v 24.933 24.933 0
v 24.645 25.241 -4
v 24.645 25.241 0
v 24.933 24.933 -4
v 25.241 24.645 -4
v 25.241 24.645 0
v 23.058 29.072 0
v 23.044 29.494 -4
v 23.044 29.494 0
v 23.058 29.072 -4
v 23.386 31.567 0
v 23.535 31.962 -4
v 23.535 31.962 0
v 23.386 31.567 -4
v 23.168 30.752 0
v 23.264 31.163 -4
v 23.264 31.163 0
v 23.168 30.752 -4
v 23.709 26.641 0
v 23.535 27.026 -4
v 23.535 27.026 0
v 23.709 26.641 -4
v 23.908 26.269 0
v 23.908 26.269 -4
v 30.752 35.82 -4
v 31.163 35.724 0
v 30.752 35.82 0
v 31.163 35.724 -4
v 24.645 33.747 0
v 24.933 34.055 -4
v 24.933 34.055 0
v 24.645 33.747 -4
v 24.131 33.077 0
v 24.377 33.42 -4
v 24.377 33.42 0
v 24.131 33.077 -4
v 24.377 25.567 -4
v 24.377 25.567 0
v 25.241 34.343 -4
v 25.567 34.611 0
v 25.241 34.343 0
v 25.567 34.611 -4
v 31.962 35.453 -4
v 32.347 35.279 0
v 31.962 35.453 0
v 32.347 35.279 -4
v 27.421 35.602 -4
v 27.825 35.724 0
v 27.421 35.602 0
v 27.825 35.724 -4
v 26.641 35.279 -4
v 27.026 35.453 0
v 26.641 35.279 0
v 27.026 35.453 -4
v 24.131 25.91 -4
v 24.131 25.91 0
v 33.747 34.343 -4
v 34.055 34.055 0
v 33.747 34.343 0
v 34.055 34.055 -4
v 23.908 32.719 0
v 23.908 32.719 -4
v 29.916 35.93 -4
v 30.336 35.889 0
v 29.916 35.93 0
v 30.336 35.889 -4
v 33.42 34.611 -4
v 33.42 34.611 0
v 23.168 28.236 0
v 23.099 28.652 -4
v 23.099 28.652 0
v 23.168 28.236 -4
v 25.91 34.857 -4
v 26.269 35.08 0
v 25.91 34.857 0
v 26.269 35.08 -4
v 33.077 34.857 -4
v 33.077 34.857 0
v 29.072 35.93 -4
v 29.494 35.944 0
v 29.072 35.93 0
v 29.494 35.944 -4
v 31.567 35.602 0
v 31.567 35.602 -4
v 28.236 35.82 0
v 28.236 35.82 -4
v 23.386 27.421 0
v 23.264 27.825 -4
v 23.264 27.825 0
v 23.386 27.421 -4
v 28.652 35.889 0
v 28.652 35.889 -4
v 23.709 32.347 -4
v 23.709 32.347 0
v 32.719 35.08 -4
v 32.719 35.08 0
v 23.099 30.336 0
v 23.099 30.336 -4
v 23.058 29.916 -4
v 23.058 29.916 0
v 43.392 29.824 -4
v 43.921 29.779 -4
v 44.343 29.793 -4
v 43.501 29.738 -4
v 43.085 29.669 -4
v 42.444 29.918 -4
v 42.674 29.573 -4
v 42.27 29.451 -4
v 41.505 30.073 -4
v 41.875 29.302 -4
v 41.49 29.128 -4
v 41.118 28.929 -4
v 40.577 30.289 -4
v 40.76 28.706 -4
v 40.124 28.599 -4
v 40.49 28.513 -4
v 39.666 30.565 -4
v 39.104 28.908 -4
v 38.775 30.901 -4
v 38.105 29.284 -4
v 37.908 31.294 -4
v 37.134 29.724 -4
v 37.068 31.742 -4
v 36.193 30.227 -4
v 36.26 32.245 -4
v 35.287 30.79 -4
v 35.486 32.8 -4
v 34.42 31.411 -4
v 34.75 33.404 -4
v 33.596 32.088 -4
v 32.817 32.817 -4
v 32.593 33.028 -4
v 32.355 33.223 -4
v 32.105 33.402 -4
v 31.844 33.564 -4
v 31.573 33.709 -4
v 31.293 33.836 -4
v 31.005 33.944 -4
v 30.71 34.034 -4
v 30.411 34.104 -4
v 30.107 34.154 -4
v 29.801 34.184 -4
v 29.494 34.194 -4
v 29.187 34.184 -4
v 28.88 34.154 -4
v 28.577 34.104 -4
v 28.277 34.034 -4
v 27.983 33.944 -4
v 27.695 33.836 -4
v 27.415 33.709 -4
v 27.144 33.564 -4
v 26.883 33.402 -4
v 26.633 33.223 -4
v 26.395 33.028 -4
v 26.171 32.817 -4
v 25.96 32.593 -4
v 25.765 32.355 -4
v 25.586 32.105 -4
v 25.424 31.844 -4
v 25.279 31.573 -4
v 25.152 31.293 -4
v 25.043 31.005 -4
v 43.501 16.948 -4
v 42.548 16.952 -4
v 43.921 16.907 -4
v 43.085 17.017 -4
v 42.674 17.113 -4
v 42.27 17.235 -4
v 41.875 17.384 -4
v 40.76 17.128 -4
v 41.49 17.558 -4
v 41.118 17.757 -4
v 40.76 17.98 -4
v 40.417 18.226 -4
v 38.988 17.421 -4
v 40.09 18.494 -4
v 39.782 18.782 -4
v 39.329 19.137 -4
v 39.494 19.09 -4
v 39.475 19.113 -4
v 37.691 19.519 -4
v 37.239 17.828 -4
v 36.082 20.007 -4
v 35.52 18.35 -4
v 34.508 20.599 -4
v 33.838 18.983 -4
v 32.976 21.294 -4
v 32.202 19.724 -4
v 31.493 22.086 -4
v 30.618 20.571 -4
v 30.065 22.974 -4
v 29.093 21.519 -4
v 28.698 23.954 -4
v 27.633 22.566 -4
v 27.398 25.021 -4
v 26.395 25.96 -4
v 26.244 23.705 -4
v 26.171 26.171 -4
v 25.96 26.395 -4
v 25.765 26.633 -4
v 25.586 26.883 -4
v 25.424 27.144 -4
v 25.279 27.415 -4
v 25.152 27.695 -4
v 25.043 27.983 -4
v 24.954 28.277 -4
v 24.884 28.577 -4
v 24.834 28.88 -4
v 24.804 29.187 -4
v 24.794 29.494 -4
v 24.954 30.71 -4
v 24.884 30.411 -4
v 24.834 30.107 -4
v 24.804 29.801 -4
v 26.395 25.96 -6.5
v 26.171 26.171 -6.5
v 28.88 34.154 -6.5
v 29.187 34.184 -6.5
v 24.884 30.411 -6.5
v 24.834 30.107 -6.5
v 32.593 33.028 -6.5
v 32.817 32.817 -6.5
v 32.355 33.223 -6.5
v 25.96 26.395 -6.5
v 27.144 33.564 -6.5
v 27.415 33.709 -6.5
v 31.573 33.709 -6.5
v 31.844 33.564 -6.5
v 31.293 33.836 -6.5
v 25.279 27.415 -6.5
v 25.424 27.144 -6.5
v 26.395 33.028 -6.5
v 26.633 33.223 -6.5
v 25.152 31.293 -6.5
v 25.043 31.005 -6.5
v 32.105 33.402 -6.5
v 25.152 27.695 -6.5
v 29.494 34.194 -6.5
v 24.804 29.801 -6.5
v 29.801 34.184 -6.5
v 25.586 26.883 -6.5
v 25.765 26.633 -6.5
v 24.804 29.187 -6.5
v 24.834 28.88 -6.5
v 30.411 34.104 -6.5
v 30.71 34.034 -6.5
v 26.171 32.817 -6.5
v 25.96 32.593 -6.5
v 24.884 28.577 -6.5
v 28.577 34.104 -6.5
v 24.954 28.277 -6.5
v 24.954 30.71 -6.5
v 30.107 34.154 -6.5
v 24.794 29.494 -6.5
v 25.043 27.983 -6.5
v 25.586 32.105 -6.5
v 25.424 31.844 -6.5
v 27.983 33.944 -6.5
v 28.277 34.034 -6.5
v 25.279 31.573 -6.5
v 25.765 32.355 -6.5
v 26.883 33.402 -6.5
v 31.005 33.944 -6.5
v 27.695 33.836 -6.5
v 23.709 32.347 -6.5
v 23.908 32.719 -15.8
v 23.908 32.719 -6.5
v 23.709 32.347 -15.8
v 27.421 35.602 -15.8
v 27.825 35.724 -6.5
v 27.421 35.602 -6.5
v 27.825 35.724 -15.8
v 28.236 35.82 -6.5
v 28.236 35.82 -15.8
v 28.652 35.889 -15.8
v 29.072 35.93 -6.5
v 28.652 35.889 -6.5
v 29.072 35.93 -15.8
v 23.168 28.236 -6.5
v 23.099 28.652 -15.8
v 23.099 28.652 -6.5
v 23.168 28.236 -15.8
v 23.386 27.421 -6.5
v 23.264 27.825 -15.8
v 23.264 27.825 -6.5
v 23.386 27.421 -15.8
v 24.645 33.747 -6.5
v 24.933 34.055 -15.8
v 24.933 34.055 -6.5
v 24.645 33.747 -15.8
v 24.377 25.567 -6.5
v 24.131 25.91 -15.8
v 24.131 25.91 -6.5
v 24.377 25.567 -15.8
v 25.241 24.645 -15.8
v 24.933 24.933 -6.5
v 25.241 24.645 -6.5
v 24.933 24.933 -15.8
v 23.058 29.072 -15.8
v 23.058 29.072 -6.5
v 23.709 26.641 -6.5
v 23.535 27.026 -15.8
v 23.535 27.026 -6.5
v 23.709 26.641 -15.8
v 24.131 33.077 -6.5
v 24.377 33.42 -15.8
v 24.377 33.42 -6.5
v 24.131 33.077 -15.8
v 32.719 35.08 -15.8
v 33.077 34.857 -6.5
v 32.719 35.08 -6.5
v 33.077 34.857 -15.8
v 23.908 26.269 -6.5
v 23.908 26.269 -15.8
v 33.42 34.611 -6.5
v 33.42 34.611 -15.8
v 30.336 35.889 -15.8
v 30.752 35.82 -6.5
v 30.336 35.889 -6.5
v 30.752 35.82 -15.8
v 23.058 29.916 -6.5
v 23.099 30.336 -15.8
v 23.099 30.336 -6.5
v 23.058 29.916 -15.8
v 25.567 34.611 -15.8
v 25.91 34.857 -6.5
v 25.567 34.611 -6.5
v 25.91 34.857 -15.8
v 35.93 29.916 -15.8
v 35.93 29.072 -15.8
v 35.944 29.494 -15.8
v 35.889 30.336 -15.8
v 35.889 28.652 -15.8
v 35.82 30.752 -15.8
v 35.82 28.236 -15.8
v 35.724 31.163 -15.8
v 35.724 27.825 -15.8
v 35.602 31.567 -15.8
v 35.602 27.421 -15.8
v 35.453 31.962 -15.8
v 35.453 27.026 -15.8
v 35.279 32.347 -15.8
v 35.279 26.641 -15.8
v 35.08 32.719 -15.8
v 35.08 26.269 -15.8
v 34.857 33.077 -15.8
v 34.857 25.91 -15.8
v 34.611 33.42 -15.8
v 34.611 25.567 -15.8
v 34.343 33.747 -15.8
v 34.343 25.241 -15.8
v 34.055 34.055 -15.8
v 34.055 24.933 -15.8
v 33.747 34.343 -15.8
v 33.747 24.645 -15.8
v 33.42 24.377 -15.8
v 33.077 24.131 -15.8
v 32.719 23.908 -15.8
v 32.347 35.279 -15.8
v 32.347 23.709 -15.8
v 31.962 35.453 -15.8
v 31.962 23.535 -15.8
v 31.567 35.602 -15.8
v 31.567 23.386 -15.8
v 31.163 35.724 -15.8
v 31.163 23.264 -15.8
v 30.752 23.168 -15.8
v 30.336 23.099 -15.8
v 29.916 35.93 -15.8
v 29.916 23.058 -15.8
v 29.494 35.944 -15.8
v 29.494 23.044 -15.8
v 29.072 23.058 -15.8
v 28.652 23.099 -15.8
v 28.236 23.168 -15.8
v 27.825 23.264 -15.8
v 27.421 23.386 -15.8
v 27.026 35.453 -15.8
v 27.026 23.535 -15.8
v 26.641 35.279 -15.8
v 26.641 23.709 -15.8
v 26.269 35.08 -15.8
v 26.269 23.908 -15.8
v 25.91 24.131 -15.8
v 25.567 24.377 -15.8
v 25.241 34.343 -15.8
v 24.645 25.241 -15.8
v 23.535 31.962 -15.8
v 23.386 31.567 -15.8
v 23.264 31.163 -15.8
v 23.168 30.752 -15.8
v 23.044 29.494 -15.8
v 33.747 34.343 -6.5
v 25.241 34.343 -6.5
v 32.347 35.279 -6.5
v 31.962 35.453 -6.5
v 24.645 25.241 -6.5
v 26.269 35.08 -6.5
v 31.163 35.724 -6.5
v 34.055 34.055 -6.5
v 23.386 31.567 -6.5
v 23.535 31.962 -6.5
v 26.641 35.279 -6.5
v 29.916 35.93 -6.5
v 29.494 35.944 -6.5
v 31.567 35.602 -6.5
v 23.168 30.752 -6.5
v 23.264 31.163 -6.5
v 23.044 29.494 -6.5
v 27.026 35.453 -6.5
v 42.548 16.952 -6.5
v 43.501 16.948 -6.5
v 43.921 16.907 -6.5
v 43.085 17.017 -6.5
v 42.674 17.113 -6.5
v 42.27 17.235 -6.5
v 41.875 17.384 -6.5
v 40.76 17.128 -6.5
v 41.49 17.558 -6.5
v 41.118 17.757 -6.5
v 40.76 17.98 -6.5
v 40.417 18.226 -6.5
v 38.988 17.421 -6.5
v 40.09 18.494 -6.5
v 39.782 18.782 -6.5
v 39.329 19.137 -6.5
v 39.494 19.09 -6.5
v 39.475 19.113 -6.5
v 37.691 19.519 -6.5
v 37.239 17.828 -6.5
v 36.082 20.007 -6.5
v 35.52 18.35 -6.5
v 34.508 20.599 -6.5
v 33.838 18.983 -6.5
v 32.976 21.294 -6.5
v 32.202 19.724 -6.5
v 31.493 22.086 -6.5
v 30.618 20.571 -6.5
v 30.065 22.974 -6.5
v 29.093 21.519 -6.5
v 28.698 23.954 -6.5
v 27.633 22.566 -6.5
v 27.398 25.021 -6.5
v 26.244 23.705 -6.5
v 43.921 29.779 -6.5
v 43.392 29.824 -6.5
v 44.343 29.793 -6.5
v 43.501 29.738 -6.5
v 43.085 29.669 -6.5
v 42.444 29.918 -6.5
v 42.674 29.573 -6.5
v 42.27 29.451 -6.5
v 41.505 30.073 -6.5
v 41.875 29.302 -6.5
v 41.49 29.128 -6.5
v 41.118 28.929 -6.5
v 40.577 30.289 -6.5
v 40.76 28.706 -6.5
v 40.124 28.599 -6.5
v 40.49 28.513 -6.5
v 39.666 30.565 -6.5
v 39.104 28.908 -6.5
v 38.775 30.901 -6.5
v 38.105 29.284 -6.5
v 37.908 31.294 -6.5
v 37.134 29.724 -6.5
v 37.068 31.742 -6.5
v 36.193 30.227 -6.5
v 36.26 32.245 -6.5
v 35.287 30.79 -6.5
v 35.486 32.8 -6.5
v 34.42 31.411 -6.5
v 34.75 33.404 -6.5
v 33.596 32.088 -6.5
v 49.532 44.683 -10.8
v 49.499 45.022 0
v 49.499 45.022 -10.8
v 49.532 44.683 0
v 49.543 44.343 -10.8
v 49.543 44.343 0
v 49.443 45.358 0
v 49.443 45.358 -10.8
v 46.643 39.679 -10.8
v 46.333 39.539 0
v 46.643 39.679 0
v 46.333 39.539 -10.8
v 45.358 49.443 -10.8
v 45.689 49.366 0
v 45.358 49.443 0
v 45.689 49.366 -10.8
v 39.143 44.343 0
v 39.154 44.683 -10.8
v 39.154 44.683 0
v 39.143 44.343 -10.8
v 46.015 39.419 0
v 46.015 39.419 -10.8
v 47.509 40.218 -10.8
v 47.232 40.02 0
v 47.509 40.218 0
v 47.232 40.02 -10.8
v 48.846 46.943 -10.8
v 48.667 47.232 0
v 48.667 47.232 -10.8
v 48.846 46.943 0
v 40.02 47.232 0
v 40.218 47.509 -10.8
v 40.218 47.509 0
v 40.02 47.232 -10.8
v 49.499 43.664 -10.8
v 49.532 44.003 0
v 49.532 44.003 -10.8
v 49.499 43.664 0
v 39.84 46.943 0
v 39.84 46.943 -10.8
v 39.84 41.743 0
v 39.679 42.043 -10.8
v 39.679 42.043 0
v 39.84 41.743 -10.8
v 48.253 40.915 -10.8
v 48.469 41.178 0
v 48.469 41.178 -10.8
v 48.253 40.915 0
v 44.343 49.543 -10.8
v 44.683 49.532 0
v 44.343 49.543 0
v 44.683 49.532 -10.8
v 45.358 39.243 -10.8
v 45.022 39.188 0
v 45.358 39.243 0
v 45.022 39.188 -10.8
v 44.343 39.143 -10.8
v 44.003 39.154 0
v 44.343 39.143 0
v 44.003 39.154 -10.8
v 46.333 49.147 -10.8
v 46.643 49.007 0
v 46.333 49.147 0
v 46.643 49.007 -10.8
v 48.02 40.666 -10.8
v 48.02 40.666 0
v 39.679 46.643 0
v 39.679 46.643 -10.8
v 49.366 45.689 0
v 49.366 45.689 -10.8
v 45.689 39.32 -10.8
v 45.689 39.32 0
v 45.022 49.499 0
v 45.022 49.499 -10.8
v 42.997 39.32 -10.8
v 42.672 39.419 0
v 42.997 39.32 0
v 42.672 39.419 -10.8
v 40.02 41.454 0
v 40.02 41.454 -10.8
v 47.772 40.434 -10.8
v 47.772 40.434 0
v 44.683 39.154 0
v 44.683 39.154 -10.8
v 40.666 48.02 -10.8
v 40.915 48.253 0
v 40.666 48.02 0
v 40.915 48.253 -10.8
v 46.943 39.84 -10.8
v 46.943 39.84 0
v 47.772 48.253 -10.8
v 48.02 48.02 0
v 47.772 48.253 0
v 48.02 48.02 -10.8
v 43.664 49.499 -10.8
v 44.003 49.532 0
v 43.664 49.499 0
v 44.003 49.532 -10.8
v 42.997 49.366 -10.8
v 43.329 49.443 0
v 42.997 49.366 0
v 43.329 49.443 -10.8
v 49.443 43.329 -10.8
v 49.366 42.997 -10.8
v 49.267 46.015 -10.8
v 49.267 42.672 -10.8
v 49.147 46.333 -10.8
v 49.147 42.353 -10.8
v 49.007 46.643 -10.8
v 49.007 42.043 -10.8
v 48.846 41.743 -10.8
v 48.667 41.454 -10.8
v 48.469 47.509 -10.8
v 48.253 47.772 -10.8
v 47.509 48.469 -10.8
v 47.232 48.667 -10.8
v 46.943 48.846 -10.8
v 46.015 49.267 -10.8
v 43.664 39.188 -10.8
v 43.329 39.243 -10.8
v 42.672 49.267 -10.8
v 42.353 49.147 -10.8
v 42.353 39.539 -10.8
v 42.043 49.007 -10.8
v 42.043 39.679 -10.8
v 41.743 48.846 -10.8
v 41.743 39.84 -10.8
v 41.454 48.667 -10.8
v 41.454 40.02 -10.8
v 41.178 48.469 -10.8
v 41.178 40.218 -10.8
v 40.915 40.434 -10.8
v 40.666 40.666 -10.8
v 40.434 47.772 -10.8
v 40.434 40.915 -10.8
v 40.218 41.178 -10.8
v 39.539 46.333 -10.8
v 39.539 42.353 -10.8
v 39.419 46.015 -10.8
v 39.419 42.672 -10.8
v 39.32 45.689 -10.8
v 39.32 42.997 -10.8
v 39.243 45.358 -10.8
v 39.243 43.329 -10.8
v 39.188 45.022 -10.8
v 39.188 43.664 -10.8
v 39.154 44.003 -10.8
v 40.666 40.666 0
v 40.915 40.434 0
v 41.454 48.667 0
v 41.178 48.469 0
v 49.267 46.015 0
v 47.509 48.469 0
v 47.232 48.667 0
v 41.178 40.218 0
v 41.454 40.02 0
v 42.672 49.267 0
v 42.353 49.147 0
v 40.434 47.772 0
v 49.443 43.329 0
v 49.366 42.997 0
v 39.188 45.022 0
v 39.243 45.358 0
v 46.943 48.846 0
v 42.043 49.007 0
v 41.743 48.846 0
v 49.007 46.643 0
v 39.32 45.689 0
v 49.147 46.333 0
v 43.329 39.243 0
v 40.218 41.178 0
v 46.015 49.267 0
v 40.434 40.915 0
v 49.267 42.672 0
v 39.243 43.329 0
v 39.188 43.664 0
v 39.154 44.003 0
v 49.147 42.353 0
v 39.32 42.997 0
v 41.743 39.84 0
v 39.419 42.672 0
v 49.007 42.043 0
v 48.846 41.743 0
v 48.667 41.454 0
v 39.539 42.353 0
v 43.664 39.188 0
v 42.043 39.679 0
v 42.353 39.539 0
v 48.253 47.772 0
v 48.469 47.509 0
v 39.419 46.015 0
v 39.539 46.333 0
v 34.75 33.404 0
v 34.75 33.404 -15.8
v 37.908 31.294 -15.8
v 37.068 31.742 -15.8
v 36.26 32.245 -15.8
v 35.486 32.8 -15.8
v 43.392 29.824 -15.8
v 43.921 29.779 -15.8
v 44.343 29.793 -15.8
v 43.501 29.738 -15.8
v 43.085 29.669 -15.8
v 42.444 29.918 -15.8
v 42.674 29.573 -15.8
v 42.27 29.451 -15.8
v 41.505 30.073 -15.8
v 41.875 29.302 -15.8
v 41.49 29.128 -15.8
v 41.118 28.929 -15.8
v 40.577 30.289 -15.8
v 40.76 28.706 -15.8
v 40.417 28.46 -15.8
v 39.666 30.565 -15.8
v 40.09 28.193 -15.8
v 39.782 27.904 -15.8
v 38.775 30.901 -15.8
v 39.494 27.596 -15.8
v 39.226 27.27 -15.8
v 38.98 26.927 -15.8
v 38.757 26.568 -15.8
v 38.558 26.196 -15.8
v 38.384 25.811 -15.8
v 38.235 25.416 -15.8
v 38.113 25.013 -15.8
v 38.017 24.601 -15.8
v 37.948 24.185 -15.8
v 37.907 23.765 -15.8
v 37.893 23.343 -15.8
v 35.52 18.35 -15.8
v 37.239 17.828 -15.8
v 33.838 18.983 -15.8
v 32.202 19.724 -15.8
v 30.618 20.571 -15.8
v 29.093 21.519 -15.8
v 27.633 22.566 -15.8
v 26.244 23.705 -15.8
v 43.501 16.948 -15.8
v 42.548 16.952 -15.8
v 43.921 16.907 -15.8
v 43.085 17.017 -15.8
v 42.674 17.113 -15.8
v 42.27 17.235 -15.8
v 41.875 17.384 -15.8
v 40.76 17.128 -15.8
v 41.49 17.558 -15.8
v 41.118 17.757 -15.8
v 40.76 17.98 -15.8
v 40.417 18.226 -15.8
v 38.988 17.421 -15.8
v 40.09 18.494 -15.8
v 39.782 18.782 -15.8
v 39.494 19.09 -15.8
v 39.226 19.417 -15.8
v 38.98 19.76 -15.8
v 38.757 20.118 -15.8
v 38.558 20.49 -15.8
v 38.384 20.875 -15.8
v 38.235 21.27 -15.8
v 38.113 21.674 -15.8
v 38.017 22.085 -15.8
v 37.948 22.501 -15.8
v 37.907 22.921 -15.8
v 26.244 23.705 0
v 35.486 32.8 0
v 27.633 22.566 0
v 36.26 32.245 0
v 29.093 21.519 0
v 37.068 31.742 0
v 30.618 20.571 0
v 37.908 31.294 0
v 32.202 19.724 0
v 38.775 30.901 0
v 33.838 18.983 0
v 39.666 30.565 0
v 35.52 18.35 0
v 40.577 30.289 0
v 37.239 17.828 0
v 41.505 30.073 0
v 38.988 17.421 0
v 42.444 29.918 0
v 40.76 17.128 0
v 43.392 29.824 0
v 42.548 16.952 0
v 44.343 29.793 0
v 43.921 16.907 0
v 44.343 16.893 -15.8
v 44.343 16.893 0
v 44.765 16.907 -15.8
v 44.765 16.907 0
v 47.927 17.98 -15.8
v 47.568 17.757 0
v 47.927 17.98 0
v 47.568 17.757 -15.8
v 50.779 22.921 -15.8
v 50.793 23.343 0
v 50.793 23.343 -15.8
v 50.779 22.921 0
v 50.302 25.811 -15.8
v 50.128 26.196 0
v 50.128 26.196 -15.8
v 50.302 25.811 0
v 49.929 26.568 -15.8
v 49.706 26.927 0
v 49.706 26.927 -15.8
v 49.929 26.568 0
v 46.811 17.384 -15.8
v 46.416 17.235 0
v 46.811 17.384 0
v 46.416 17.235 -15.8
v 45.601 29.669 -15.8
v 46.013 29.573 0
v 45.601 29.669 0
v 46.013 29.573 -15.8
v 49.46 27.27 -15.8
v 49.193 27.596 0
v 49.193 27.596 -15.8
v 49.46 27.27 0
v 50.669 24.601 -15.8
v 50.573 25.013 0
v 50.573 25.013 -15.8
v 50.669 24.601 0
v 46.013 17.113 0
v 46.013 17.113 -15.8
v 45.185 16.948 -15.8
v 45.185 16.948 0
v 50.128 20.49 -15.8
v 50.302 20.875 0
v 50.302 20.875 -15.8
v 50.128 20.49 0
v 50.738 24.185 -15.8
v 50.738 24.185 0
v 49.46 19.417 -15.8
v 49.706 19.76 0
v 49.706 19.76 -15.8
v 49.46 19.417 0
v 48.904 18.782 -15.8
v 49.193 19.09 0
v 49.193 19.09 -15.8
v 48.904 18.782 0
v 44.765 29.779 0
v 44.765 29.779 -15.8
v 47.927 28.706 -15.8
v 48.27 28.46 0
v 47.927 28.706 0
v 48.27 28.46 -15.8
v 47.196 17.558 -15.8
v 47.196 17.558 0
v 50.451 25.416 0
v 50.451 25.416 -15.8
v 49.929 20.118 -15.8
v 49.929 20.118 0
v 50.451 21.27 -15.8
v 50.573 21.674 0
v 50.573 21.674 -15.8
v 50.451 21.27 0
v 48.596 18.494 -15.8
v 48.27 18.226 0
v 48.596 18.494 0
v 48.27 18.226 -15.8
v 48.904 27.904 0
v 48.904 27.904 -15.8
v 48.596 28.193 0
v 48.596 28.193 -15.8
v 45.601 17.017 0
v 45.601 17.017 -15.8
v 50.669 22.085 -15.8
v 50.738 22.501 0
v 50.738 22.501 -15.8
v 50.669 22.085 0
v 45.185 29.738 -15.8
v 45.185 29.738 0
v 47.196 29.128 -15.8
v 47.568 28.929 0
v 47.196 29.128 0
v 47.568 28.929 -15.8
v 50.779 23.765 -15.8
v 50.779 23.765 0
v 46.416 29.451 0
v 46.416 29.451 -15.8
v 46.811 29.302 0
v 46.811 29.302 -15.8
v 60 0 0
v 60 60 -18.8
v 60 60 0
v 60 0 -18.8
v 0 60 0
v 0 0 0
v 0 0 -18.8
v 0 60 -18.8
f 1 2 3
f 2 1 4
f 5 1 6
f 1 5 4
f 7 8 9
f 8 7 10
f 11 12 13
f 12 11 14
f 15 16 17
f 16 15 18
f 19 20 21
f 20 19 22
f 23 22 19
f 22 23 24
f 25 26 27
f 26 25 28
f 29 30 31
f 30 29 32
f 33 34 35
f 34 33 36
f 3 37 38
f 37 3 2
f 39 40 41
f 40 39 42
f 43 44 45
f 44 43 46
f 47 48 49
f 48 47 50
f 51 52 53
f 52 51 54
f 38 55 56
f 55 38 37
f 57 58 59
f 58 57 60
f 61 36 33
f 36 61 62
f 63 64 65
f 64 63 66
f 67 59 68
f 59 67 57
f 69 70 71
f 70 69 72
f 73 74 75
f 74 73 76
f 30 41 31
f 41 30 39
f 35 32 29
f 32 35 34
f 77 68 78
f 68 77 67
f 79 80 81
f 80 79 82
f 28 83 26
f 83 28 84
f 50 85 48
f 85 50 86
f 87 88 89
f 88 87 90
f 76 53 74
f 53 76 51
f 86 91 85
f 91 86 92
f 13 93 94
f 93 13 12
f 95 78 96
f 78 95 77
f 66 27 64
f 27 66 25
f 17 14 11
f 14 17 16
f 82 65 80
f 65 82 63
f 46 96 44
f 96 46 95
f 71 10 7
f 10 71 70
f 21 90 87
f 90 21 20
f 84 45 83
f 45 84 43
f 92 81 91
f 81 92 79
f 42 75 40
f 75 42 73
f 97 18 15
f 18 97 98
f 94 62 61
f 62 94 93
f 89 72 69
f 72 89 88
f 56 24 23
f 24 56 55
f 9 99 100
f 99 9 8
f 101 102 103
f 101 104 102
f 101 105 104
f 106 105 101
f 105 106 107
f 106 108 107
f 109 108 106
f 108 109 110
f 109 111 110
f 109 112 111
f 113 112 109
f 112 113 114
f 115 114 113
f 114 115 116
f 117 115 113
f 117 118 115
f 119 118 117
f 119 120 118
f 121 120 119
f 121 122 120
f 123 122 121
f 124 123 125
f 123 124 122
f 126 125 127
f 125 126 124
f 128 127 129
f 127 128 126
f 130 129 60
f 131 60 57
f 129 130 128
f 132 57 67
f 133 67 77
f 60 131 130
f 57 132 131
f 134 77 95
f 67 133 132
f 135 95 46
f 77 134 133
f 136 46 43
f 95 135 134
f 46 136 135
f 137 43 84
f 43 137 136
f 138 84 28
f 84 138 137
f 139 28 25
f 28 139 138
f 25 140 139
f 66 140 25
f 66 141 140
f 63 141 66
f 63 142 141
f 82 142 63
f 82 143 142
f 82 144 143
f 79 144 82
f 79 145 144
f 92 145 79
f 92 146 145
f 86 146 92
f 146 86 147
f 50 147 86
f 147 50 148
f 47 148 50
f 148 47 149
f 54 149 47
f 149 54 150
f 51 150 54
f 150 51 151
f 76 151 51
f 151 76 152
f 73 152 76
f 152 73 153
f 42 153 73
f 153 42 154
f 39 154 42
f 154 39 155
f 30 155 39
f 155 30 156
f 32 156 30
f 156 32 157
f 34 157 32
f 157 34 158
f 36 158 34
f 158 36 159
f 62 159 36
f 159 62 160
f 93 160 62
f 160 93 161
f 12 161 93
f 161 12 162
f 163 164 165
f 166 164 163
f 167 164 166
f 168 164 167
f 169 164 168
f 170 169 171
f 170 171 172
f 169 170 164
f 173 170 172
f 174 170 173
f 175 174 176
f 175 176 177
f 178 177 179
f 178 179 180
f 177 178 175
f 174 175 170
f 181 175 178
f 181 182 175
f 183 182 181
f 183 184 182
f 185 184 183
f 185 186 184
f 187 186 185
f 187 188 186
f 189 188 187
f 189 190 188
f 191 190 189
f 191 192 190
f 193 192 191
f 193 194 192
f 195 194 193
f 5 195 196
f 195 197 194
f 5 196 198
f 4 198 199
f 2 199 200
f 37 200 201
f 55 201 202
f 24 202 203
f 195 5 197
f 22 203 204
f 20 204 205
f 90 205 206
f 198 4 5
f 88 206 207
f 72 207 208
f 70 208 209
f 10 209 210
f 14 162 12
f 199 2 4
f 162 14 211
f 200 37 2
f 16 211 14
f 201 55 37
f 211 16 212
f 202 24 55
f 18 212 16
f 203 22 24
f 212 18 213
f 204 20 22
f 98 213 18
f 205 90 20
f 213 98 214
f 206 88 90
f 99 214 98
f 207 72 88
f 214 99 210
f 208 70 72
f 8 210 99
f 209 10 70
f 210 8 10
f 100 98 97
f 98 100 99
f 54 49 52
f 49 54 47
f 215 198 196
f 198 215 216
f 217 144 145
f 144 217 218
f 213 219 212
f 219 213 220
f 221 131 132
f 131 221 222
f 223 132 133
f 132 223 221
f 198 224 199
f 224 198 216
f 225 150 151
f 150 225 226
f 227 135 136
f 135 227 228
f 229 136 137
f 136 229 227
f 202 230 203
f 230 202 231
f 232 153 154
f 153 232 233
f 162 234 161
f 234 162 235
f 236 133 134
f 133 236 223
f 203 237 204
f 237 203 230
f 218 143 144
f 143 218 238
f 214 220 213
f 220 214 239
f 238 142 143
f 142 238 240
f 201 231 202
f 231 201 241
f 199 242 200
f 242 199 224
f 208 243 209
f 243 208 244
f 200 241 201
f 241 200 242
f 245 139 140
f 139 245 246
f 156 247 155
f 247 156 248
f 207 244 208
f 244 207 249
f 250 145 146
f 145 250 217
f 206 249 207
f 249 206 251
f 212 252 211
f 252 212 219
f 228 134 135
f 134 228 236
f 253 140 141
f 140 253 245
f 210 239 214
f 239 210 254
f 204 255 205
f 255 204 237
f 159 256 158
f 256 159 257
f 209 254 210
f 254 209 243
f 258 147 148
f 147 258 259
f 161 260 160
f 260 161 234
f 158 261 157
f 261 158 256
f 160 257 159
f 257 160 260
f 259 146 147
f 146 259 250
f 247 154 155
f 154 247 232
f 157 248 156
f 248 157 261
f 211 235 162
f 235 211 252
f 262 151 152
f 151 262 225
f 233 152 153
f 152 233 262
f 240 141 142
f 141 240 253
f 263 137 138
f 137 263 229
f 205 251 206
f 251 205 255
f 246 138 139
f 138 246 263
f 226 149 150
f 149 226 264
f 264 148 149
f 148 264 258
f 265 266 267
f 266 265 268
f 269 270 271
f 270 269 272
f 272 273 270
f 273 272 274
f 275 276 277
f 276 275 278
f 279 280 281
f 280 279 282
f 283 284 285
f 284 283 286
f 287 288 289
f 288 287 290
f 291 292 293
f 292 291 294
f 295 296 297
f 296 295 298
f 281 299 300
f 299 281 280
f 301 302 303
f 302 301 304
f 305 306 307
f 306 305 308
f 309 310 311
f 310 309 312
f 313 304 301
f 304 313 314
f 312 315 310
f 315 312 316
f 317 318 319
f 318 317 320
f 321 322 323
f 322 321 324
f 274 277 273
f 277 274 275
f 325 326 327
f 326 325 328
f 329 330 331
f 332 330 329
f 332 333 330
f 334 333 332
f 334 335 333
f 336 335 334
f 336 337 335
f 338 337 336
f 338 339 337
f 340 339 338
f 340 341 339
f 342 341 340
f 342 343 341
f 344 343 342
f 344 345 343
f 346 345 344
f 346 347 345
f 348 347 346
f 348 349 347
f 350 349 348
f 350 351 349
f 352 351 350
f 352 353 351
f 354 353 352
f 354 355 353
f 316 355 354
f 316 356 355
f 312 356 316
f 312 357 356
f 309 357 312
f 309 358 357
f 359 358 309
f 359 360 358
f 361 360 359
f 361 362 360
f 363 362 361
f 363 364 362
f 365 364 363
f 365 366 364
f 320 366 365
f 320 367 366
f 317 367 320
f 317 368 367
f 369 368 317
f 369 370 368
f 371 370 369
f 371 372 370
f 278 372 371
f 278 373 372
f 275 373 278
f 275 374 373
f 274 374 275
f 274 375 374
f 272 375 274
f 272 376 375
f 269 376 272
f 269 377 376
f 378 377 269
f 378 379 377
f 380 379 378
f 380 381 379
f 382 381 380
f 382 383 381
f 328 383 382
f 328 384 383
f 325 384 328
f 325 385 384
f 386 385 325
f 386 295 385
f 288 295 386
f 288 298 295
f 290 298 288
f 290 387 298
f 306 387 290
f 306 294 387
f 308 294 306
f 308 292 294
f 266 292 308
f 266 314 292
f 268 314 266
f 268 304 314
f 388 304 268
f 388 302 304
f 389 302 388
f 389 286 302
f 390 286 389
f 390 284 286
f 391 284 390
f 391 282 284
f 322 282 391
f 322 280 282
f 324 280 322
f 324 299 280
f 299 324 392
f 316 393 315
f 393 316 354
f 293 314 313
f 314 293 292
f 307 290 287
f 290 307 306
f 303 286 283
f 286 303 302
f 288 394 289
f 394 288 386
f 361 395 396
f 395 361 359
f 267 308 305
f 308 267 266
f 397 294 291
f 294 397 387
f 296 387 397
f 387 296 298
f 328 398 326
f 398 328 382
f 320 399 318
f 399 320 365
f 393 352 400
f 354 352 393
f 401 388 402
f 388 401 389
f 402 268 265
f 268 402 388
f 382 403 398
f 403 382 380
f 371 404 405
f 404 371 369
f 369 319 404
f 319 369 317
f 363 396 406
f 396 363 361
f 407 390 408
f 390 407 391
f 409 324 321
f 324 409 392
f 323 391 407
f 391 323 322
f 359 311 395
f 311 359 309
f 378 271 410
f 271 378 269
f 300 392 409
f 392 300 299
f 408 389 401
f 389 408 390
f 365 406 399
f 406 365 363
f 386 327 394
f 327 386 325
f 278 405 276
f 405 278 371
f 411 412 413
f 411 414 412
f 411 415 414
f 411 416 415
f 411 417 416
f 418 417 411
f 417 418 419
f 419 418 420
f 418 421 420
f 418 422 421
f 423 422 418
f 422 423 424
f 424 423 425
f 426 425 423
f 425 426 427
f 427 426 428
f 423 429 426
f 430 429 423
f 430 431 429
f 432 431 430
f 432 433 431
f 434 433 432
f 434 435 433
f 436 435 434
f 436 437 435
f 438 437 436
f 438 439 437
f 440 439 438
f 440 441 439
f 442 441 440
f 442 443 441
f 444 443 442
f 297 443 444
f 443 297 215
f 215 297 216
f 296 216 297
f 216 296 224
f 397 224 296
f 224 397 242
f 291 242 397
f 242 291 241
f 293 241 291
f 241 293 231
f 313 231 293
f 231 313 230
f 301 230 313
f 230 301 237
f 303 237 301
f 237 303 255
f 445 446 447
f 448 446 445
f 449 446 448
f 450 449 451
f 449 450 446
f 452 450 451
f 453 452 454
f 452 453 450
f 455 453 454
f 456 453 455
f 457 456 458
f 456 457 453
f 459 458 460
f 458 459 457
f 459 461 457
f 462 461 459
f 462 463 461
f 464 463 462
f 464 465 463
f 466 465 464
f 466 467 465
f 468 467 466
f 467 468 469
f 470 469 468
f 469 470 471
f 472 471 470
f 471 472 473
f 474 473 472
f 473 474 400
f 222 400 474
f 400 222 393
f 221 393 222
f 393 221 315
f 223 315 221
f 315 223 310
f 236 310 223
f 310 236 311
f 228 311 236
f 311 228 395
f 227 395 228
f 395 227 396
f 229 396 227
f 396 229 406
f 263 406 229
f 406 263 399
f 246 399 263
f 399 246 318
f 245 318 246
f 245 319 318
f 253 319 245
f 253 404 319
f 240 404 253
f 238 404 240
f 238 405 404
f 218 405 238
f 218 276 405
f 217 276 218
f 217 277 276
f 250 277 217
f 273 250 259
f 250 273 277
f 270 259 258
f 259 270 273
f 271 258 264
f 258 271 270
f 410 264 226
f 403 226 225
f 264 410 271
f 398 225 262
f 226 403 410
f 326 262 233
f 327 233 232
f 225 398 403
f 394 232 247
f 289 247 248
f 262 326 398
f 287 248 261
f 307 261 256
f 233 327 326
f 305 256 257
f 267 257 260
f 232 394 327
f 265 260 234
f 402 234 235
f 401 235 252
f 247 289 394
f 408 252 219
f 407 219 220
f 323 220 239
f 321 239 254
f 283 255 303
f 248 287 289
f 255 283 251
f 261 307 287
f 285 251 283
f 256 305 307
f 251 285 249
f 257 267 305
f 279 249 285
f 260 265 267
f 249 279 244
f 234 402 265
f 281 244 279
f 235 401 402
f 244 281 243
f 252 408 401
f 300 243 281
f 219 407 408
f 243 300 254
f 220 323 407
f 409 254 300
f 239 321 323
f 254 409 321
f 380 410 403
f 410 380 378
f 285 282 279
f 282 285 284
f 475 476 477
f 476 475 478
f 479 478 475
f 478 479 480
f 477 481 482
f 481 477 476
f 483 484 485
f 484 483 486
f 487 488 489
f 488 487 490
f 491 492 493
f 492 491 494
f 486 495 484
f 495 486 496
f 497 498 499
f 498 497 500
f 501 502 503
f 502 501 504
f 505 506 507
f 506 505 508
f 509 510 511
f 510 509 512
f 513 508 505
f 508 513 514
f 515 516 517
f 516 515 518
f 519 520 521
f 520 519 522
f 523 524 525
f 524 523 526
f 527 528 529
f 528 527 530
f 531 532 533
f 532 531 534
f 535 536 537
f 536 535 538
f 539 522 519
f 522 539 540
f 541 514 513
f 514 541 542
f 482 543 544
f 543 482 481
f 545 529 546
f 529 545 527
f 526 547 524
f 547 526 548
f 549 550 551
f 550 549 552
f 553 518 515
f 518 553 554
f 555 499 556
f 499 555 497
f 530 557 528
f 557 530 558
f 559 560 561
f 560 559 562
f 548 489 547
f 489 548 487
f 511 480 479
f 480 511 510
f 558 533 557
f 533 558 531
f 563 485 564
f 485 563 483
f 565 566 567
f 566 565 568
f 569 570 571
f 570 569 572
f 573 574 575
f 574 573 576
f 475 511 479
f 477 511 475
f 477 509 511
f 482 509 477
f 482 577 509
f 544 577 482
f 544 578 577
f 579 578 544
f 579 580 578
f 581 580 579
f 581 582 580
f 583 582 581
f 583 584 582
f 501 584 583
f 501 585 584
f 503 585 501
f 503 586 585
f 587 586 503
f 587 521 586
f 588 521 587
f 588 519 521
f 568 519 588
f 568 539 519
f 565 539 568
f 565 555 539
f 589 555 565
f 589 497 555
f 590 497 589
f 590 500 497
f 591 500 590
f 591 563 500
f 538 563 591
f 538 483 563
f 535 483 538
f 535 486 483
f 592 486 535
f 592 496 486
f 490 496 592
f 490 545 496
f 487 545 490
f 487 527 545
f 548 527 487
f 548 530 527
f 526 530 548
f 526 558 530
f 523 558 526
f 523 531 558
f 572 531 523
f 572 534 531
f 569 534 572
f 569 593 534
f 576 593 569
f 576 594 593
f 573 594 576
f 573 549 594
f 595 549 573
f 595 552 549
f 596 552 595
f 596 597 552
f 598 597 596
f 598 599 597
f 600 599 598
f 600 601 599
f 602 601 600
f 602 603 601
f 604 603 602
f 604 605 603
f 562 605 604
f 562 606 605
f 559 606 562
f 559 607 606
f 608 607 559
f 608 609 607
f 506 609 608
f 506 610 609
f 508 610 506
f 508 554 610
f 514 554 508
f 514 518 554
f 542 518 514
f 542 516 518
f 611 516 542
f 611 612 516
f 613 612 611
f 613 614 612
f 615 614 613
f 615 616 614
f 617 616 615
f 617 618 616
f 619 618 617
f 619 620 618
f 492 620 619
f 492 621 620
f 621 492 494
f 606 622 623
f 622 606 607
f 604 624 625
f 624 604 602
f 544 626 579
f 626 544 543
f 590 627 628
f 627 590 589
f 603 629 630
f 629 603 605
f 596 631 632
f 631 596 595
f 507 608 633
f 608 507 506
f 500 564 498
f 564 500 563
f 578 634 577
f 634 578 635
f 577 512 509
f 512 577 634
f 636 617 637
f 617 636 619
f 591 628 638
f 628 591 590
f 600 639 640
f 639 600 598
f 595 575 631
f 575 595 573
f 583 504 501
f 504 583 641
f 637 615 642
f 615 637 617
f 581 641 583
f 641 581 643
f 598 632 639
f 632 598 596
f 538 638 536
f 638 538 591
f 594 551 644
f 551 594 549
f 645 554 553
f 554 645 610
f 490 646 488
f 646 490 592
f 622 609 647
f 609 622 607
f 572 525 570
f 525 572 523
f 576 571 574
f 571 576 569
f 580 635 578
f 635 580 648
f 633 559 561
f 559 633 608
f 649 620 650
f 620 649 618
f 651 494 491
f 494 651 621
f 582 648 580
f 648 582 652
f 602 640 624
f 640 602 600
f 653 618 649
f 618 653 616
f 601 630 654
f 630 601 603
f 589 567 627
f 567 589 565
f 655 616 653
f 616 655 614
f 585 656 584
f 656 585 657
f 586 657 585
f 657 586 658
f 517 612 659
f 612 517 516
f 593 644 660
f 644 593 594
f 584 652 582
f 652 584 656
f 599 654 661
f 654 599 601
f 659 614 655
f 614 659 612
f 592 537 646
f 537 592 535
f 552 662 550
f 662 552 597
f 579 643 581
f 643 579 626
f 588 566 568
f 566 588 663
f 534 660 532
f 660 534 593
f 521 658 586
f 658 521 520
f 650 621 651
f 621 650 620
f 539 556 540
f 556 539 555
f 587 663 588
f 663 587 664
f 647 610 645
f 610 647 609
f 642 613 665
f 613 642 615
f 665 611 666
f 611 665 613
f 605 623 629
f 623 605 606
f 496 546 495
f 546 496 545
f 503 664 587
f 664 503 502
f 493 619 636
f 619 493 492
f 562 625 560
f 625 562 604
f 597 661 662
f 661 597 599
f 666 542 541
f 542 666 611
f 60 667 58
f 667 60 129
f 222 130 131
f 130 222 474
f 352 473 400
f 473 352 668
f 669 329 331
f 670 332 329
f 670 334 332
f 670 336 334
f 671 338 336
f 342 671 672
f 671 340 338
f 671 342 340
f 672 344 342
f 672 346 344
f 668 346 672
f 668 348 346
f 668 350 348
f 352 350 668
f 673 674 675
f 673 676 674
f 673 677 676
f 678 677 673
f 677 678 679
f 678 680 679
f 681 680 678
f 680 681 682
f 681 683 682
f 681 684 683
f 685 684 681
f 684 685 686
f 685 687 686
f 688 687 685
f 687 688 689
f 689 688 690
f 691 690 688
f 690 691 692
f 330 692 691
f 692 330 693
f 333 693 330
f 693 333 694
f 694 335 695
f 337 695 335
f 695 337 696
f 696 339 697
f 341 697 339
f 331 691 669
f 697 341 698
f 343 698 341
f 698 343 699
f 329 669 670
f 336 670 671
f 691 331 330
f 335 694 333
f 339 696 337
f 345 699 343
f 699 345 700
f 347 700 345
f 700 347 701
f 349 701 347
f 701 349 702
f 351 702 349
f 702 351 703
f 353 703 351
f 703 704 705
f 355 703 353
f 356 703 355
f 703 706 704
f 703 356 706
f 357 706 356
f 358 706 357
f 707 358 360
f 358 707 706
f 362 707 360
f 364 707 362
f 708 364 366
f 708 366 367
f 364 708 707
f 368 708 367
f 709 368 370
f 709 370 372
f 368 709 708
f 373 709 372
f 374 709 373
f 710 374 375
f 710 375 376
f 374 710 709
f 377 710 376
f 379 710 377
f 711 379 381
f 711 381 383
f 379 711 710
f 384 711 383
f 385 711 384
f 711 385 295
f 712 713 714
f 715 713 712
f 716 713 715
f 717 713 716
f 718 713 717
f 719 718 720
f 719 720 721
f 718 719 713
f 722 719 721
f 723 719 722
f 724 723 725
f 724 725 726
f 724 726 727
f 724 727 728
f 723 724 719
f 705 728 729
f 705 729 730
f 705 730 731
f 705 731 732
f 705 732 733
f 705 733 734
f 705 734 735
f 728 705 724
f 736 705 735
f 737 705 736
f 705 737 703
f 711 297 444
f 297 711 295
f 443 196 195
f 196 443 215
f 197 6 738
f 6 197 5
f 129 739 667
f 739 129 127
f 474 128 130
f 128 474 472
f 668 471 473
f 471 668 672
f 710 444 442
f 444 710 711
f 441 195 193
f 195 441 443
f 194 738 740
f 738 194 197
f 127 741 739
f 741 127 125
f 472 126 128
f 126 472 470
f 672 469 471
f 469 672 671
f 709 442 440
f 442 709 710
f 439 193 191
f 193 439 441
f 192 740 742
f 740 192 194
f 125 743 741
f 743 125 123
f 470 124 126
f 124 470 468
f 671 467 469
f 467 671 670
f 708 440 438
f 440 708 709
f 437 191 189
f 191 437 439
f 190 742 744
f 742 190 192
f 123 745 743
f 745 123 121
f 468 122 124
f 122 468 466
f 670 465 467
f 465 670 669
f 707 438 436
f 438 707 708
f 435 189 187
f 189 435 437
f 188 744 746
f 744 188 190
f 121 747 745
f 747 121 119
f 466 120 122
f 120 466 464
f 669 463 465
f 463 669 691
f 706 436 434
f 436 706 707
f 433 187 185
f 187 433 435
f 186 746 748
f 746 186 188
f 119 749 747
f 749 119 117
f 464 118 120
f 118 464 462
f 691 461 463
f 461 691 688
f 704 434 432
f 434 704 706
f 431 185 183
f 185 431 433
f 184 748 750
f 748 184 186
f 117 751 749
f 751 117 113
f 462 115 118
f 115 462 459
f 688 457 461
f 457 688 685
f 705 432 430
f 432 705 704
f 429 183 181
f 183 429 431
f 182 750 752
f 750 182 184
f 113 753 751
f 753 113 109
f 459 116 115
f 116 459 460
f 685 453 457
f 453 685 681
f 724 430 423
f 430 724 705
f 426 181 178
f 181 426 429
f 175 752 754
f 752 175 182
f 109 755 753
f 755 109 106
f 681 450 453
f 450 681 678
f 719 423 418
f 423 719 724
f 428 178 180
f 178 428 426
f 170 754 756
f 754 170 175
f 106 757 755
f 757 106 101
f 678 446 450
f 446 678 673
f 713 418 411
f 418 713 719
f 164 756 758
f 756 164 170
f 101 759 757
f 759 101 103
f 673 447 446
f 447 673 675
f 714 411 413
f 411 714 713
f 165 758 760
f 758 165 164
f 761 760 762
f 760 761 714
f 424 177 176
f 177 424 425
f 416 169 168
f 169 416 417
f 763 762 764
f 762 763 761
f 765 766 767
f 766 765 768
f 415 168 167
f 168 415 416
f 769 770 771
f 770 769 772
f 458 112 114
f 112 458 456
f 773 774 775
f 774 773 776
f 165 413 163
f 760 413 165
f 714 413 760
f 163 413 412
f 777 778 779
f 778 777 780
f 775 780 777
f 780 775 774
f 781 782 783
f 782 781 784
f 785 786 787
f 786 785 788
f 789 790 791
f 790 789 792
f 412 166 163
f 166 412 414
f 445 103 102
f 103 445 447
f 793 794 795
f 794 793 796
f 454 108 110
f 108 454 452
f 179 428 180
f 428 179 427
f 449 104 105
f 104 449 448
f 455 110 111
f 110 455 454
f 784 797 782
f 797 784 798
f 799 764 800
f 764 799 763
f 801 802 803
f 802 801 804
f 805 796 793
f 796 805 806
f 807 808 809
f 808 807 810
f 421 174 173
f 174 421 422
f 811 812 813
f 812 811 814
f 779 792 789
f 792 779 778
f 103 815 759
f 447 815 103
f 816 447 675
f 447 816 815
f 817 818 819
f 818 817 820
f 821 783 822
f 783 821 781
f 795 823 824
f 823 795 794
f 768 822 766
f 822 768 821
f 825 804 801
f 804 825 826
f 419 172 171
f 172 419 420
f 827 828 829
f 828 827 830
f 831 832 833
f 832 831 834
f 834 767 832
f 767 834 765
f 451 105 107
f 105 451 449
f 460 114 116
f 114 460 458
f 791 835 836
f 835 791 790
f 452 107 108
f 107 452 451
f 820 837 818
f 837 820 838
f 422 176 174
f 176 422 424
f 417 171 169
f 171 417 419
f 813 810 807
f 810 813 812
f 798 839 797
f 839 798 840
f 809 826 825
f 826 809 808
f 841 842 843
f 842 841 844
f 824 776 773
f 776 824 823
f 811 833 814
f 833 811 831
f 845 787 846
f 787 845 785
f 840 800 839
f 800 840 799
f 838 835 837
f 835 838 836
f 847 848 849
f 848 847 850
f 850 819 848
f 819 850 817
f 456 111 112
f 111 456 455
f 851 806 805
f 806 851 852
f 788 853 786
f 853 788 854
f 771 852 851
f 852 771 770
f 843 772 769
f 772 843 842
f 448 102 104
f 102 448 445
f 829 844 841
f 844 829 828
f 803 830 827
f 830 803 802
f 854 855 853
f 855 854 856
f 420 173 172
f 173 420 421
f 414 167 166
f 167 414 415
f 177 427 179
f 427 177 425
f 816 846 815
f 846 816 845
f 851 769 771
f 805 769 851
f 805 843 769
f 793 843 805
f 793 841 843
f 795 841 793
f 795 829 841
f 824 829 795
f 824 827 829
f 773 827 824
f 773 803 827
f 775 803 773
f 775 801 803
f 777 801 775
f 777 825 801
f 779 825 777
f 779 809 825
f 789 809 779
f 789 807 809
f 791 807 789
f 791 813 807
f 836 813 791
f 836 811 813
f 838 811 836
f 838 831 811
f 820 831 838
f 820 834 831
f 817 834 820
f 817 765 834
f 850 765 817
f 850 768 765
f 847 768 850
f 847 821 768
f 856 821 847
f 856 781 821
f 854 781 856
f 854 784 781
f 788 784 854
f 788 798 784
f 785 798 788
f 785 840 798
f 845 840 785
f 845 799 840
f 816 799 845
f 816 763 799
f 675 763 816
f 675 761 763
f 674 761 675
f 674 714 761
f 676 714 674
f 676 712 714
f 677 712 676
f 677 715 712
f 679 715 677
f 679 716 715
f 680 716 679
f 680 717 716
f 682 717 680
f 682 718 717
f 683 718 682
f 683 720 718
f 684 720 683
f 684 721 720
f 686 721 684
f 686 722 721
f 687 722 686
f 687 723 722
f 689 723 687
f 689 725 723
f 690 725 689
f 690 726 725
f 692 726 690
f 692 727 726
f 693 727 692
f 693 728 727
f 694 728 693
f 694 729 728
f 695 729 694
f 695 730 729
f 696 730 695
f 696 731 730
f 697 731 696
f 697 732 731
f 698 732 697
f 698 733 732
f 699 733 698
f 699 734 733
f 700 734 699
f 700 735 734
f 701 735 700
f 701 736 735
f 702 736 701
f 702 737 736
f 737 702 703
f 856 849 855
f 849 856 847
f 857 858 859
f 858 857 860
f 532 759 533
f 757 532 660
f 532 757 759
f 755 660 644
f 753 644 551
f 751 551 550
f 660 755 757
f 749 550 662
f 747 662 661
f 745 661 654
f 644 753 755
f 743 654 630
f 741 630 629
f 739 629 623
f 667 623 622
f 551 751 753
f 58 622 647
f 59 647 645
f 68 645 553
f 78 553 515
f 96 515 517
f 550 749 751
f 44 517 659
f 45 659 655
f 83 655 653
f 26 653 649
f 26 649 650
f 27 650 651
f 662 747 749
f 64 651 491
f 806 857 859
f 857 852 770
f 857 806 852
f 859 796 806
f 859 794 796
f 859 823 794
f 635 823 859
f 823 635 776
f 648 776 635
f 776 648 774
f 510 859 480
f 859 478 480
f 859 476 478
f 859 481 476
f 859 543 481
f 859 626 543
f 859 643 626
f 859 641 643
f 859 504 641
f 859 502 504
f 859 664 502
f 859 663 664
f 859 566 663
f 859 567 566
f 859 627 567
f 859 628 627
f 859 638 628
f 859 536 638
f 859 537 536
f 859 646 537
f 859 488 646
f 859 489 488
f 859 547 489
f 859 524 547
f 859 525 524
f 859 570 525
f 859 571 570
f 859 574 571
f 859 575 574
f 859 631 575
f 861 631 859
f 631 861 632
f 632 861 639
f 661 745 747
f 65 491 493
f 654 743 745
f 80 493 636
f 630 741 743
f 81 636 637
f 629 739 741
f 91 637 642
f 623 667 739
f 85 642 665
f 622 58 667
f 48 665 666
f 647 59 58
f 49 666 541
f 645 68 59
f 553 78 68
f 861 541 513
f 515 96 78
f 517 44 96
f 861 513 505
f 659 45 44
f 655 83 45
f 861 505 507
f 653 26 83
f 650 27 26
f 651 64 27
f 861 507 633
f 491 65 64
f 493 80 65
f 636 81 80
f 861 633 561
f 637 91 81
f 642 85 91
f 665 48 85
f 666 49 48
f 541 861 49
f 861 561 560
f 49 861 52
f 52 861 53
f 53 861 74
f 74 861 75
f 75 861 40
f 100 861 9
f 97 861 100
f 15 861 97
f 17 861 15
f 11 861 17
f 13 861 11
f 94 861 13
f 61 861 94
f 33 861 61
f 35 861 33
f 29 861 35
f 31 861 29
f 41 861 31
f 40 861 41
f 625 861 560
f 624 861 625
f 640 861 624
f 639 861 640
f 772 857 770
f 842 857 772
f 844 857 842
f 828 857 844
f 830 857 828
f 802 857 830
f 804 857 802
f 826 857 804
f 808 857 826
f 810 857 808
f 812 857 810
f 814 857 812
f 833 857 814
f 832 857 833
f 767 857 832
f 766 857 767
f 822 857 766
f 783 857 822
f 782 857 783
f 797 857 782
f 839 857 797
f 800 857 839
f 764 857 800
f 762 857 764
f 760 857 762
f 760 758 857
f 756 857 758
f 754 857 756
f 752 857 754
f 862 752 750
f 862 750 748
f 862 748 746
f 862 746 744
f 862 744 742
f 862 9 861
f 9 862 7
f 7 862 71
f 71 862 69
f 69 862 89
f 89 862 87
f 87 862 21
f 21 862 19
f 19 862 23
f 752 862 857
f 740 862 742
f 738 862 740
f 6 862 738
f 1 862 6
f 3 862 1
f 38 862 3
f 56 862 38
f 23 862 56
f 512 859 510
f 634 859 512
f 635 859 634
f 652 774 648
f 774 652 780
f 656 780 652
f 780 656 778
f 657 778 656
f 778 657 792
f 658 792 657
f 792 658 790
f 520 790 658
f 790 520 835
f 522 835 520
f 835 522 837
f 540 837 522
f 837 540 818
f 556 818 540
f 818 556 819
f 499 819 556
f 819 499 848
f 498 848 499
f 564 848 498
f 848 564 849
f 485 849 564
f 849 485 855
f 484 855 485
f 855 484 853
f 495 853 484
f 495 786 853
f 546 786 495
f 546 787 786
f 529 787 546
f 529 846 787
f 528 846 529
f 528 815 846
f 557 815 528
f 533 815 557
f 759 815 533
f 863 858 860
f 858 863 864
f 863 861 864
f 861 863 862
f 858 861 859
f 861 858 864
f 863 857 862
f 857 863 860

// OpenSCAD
// Logement des pieds IKEA TINGBY, à intégrer dans les coins imprimés de la table à sable.
//
// Principe (notice IKEA AA-2544065-2, étape 1) : chaque pied porte 2 pions vissés dans son bout.
//  - petit pion (tête Ø10, 10 de haut) = PIVOT, dans un trou rond ;
//  - gros pion (tête Ø12,5, 15 de haut) = VERROU, dans une rainure en arc : on l'enfonce dans le
//    trou d'entrée, puis on tourne le pied de 45° autour du pivot ; une lèvre vient se loger dans
//    une gorge du gros pion et bloque le pied.
//
// REPÈRE : on regarde la face de dessous du plateau (table retournée).
//   origine = angle formé par les deux bords droits du plateau, X et Y le long de ces bords, Z vers soi.
//   La matière est en Z < 0.
//
// Cotes relevées sur la table : pions sur la diagonale du pied, à 8 mm (pivot) et 29 mm (verrou)
// de la pointe du pied. La pointe du pied est le centre de l'arrondi R50 du coin, soit (50 ; 50).
// Cotes encore À CONFIRMER : SENS de rotation, profondeur et hauteur de la gorge (lèvre).
// Fichier non compilé dans l'environnement de rédaction : vérifier l'aperçu dans OpenSCAD.

// ---------- Pions (mesurés) ----------
PIV_TETE_D  = 10;    // petit pion : Ø des collerettes
PIV_GORGE_D = 8;     // petit pion : Ø au fond des gorges
PIV_TETE_H  = 10;    // petit pion : hauteur de la tête
VER_TETE_D  = 12.5;  // gros pion : Ø des collerettes
VER_GORGE_D = 9;     // gros pion : Ø au fond des gorges
VER_TETE_H  = 15;    // gros pion : hauteur de la tête

// ---------- Implantation (mesurée) ----------
POINTE    = [50, 50];  // pointe du pied = centre de l'arrondi R50
DIST_PIV  = 8;         // pointe -> centre du petit pion
DIST_VER  = 29;        // pointe -> centre du gros pion
DIRECTION = 225;       // la diagonale part de la pointe vers l'angle arrondi

// ---------- À confirmer ----------
SENS     = 1;     // +1 : le pied se pose tourné de +45° (trou d'entrée à 270°), -1 : à 180°
ROTATION = 45;
LEVRE_Z0 = 4;     // profondeur du haut de la lèvre (= début de la gorge du gros pion, depuis le bout du pied)
LEVRE_H  = 2.5;   // épaisseur de la lèvre (< hauteur de la gorge)

// ---------- Impression ----------
JEU    = 0.4;     // jeu sur les diamètres
JEU_Z  = 0.8;     // garde en profondeur
EP_EPROUVETTE = VER_TETE_H + JEU_Z + 3;
$fn = 96;

A = DIST_VER - DIST_PIV;                                     // entraxe = rayon de la rainure (21)
PIV = POINTE + DIST_PIV * [cos(DIRECTION), sin(DIRECTION)];  // (44,34 ; 44,34)
LARGE  = VER_TETE_D + JEU;    // passage des collerettes
ETROIT = VER_GORGE_D + JEU;   // lèvre : passe dans la gorge, pas les collerettes
PROF   = VER_TETE_H + JEU_Z;

echo(str("Pivot en ", PIV, " ; verrou en ", POINTE + DIST_VER * [cos(DIRECTION), sin(DIRECTION)], " ; entraxe ", A));

// Profil (r, z) de la rainure, z positif vers l'intérieur de la matière
module profil_rainure() {
    polygon([
        [A - LARGE / 2, -0.01], [A + LARGE / 2, -0.01],
        [A + LARGE / 2, LEVRE_Z0], [A + ETROIT / 2, LEVRE_Z0],
        [A + ETROIT / 2, LEVRE_Z0 + LEVRE_H], [A + LARGE / 2, LEVRE_Z0 + LEVRE_H],
        [A + LARGE / 2, PROF], [A - LARGE / 2, PROF],
        [A - LARGE / 2, LEVRE_Z0 + LEVRE_H], [A - ETROIT / 2, LEVRE_Z0 + LEVRE_H],
        [A - ETROIT / 2, LEVRE_Z0], [A - LARGE / 2, LEVRE_Z0]
    ]);
}

module logement_tingby() {
    a_entree = DIRECTION + SENS * ROTATION;
    a_debut = min(DIRECTION, a_entree);
    mirror([0, 0, 1])
    translate([PIV[0], PIV[1], 0]) {
        // trou du pivot (petit pion)
        translate([0, 0, -0.01]) cylinder(d = PIV_TETE_D + JEU, h = PIV_TETE_H + JEU_Z + 0.01);
        // rainure en arc avec lèvre
        rotate([0, 0, a_debut]) rotate_extrude(angle = ROTATION) profil_rainure();
        // bout de la rainure (position verrouillée)
        rotate([0, 0, DIRECTION]) translate([A, 0, 0]) {
            translate([0, 0, -0.01]) cylinder(d = LARGE, h = LEVRE_Z0 + 0.01);
            translate([0, 0, LEVRE_Z0 - 0.01]) cylinder(d = ETROIT, h = LEVRE_H + 0.02);
            translate([0, 0, LEVRE_Z0 + LEVRE_H]) cylinder(d = LARGE, h = PROF - LEVRE_Z0 - LEVRE_H);
        }
        // trou d'entrée sur toute la profondeur
        rotate([0, 0, a_entree]) translate([A, 0, -0.01]) cylinder(d = LARGE, h = PROF + 0.01);
    }
}

// Éprouvette : imprimer face de dessous sur le plateau, puis tester avec un vrai pied
module eprouvette() {
    difference() {
        translate([0, 0, -EP_EPROUVETTE]) cube([60, 60, EP_EPROUVETTE]);
        logement_tingby();
    }
}

// Les 4 logements sur un plateau de 500 x 500 (pieds identiques tournés de 90°)
module quatre_logements(cote = 500) {
    for (i = [0 : 3])
        translate([cote / 2, cote / 2, 0]) rotate([0, 0, 90 * i])
            translate([-cote / 2, -cote / 2, 0]) logement_tingby();
}

eprouvette();
